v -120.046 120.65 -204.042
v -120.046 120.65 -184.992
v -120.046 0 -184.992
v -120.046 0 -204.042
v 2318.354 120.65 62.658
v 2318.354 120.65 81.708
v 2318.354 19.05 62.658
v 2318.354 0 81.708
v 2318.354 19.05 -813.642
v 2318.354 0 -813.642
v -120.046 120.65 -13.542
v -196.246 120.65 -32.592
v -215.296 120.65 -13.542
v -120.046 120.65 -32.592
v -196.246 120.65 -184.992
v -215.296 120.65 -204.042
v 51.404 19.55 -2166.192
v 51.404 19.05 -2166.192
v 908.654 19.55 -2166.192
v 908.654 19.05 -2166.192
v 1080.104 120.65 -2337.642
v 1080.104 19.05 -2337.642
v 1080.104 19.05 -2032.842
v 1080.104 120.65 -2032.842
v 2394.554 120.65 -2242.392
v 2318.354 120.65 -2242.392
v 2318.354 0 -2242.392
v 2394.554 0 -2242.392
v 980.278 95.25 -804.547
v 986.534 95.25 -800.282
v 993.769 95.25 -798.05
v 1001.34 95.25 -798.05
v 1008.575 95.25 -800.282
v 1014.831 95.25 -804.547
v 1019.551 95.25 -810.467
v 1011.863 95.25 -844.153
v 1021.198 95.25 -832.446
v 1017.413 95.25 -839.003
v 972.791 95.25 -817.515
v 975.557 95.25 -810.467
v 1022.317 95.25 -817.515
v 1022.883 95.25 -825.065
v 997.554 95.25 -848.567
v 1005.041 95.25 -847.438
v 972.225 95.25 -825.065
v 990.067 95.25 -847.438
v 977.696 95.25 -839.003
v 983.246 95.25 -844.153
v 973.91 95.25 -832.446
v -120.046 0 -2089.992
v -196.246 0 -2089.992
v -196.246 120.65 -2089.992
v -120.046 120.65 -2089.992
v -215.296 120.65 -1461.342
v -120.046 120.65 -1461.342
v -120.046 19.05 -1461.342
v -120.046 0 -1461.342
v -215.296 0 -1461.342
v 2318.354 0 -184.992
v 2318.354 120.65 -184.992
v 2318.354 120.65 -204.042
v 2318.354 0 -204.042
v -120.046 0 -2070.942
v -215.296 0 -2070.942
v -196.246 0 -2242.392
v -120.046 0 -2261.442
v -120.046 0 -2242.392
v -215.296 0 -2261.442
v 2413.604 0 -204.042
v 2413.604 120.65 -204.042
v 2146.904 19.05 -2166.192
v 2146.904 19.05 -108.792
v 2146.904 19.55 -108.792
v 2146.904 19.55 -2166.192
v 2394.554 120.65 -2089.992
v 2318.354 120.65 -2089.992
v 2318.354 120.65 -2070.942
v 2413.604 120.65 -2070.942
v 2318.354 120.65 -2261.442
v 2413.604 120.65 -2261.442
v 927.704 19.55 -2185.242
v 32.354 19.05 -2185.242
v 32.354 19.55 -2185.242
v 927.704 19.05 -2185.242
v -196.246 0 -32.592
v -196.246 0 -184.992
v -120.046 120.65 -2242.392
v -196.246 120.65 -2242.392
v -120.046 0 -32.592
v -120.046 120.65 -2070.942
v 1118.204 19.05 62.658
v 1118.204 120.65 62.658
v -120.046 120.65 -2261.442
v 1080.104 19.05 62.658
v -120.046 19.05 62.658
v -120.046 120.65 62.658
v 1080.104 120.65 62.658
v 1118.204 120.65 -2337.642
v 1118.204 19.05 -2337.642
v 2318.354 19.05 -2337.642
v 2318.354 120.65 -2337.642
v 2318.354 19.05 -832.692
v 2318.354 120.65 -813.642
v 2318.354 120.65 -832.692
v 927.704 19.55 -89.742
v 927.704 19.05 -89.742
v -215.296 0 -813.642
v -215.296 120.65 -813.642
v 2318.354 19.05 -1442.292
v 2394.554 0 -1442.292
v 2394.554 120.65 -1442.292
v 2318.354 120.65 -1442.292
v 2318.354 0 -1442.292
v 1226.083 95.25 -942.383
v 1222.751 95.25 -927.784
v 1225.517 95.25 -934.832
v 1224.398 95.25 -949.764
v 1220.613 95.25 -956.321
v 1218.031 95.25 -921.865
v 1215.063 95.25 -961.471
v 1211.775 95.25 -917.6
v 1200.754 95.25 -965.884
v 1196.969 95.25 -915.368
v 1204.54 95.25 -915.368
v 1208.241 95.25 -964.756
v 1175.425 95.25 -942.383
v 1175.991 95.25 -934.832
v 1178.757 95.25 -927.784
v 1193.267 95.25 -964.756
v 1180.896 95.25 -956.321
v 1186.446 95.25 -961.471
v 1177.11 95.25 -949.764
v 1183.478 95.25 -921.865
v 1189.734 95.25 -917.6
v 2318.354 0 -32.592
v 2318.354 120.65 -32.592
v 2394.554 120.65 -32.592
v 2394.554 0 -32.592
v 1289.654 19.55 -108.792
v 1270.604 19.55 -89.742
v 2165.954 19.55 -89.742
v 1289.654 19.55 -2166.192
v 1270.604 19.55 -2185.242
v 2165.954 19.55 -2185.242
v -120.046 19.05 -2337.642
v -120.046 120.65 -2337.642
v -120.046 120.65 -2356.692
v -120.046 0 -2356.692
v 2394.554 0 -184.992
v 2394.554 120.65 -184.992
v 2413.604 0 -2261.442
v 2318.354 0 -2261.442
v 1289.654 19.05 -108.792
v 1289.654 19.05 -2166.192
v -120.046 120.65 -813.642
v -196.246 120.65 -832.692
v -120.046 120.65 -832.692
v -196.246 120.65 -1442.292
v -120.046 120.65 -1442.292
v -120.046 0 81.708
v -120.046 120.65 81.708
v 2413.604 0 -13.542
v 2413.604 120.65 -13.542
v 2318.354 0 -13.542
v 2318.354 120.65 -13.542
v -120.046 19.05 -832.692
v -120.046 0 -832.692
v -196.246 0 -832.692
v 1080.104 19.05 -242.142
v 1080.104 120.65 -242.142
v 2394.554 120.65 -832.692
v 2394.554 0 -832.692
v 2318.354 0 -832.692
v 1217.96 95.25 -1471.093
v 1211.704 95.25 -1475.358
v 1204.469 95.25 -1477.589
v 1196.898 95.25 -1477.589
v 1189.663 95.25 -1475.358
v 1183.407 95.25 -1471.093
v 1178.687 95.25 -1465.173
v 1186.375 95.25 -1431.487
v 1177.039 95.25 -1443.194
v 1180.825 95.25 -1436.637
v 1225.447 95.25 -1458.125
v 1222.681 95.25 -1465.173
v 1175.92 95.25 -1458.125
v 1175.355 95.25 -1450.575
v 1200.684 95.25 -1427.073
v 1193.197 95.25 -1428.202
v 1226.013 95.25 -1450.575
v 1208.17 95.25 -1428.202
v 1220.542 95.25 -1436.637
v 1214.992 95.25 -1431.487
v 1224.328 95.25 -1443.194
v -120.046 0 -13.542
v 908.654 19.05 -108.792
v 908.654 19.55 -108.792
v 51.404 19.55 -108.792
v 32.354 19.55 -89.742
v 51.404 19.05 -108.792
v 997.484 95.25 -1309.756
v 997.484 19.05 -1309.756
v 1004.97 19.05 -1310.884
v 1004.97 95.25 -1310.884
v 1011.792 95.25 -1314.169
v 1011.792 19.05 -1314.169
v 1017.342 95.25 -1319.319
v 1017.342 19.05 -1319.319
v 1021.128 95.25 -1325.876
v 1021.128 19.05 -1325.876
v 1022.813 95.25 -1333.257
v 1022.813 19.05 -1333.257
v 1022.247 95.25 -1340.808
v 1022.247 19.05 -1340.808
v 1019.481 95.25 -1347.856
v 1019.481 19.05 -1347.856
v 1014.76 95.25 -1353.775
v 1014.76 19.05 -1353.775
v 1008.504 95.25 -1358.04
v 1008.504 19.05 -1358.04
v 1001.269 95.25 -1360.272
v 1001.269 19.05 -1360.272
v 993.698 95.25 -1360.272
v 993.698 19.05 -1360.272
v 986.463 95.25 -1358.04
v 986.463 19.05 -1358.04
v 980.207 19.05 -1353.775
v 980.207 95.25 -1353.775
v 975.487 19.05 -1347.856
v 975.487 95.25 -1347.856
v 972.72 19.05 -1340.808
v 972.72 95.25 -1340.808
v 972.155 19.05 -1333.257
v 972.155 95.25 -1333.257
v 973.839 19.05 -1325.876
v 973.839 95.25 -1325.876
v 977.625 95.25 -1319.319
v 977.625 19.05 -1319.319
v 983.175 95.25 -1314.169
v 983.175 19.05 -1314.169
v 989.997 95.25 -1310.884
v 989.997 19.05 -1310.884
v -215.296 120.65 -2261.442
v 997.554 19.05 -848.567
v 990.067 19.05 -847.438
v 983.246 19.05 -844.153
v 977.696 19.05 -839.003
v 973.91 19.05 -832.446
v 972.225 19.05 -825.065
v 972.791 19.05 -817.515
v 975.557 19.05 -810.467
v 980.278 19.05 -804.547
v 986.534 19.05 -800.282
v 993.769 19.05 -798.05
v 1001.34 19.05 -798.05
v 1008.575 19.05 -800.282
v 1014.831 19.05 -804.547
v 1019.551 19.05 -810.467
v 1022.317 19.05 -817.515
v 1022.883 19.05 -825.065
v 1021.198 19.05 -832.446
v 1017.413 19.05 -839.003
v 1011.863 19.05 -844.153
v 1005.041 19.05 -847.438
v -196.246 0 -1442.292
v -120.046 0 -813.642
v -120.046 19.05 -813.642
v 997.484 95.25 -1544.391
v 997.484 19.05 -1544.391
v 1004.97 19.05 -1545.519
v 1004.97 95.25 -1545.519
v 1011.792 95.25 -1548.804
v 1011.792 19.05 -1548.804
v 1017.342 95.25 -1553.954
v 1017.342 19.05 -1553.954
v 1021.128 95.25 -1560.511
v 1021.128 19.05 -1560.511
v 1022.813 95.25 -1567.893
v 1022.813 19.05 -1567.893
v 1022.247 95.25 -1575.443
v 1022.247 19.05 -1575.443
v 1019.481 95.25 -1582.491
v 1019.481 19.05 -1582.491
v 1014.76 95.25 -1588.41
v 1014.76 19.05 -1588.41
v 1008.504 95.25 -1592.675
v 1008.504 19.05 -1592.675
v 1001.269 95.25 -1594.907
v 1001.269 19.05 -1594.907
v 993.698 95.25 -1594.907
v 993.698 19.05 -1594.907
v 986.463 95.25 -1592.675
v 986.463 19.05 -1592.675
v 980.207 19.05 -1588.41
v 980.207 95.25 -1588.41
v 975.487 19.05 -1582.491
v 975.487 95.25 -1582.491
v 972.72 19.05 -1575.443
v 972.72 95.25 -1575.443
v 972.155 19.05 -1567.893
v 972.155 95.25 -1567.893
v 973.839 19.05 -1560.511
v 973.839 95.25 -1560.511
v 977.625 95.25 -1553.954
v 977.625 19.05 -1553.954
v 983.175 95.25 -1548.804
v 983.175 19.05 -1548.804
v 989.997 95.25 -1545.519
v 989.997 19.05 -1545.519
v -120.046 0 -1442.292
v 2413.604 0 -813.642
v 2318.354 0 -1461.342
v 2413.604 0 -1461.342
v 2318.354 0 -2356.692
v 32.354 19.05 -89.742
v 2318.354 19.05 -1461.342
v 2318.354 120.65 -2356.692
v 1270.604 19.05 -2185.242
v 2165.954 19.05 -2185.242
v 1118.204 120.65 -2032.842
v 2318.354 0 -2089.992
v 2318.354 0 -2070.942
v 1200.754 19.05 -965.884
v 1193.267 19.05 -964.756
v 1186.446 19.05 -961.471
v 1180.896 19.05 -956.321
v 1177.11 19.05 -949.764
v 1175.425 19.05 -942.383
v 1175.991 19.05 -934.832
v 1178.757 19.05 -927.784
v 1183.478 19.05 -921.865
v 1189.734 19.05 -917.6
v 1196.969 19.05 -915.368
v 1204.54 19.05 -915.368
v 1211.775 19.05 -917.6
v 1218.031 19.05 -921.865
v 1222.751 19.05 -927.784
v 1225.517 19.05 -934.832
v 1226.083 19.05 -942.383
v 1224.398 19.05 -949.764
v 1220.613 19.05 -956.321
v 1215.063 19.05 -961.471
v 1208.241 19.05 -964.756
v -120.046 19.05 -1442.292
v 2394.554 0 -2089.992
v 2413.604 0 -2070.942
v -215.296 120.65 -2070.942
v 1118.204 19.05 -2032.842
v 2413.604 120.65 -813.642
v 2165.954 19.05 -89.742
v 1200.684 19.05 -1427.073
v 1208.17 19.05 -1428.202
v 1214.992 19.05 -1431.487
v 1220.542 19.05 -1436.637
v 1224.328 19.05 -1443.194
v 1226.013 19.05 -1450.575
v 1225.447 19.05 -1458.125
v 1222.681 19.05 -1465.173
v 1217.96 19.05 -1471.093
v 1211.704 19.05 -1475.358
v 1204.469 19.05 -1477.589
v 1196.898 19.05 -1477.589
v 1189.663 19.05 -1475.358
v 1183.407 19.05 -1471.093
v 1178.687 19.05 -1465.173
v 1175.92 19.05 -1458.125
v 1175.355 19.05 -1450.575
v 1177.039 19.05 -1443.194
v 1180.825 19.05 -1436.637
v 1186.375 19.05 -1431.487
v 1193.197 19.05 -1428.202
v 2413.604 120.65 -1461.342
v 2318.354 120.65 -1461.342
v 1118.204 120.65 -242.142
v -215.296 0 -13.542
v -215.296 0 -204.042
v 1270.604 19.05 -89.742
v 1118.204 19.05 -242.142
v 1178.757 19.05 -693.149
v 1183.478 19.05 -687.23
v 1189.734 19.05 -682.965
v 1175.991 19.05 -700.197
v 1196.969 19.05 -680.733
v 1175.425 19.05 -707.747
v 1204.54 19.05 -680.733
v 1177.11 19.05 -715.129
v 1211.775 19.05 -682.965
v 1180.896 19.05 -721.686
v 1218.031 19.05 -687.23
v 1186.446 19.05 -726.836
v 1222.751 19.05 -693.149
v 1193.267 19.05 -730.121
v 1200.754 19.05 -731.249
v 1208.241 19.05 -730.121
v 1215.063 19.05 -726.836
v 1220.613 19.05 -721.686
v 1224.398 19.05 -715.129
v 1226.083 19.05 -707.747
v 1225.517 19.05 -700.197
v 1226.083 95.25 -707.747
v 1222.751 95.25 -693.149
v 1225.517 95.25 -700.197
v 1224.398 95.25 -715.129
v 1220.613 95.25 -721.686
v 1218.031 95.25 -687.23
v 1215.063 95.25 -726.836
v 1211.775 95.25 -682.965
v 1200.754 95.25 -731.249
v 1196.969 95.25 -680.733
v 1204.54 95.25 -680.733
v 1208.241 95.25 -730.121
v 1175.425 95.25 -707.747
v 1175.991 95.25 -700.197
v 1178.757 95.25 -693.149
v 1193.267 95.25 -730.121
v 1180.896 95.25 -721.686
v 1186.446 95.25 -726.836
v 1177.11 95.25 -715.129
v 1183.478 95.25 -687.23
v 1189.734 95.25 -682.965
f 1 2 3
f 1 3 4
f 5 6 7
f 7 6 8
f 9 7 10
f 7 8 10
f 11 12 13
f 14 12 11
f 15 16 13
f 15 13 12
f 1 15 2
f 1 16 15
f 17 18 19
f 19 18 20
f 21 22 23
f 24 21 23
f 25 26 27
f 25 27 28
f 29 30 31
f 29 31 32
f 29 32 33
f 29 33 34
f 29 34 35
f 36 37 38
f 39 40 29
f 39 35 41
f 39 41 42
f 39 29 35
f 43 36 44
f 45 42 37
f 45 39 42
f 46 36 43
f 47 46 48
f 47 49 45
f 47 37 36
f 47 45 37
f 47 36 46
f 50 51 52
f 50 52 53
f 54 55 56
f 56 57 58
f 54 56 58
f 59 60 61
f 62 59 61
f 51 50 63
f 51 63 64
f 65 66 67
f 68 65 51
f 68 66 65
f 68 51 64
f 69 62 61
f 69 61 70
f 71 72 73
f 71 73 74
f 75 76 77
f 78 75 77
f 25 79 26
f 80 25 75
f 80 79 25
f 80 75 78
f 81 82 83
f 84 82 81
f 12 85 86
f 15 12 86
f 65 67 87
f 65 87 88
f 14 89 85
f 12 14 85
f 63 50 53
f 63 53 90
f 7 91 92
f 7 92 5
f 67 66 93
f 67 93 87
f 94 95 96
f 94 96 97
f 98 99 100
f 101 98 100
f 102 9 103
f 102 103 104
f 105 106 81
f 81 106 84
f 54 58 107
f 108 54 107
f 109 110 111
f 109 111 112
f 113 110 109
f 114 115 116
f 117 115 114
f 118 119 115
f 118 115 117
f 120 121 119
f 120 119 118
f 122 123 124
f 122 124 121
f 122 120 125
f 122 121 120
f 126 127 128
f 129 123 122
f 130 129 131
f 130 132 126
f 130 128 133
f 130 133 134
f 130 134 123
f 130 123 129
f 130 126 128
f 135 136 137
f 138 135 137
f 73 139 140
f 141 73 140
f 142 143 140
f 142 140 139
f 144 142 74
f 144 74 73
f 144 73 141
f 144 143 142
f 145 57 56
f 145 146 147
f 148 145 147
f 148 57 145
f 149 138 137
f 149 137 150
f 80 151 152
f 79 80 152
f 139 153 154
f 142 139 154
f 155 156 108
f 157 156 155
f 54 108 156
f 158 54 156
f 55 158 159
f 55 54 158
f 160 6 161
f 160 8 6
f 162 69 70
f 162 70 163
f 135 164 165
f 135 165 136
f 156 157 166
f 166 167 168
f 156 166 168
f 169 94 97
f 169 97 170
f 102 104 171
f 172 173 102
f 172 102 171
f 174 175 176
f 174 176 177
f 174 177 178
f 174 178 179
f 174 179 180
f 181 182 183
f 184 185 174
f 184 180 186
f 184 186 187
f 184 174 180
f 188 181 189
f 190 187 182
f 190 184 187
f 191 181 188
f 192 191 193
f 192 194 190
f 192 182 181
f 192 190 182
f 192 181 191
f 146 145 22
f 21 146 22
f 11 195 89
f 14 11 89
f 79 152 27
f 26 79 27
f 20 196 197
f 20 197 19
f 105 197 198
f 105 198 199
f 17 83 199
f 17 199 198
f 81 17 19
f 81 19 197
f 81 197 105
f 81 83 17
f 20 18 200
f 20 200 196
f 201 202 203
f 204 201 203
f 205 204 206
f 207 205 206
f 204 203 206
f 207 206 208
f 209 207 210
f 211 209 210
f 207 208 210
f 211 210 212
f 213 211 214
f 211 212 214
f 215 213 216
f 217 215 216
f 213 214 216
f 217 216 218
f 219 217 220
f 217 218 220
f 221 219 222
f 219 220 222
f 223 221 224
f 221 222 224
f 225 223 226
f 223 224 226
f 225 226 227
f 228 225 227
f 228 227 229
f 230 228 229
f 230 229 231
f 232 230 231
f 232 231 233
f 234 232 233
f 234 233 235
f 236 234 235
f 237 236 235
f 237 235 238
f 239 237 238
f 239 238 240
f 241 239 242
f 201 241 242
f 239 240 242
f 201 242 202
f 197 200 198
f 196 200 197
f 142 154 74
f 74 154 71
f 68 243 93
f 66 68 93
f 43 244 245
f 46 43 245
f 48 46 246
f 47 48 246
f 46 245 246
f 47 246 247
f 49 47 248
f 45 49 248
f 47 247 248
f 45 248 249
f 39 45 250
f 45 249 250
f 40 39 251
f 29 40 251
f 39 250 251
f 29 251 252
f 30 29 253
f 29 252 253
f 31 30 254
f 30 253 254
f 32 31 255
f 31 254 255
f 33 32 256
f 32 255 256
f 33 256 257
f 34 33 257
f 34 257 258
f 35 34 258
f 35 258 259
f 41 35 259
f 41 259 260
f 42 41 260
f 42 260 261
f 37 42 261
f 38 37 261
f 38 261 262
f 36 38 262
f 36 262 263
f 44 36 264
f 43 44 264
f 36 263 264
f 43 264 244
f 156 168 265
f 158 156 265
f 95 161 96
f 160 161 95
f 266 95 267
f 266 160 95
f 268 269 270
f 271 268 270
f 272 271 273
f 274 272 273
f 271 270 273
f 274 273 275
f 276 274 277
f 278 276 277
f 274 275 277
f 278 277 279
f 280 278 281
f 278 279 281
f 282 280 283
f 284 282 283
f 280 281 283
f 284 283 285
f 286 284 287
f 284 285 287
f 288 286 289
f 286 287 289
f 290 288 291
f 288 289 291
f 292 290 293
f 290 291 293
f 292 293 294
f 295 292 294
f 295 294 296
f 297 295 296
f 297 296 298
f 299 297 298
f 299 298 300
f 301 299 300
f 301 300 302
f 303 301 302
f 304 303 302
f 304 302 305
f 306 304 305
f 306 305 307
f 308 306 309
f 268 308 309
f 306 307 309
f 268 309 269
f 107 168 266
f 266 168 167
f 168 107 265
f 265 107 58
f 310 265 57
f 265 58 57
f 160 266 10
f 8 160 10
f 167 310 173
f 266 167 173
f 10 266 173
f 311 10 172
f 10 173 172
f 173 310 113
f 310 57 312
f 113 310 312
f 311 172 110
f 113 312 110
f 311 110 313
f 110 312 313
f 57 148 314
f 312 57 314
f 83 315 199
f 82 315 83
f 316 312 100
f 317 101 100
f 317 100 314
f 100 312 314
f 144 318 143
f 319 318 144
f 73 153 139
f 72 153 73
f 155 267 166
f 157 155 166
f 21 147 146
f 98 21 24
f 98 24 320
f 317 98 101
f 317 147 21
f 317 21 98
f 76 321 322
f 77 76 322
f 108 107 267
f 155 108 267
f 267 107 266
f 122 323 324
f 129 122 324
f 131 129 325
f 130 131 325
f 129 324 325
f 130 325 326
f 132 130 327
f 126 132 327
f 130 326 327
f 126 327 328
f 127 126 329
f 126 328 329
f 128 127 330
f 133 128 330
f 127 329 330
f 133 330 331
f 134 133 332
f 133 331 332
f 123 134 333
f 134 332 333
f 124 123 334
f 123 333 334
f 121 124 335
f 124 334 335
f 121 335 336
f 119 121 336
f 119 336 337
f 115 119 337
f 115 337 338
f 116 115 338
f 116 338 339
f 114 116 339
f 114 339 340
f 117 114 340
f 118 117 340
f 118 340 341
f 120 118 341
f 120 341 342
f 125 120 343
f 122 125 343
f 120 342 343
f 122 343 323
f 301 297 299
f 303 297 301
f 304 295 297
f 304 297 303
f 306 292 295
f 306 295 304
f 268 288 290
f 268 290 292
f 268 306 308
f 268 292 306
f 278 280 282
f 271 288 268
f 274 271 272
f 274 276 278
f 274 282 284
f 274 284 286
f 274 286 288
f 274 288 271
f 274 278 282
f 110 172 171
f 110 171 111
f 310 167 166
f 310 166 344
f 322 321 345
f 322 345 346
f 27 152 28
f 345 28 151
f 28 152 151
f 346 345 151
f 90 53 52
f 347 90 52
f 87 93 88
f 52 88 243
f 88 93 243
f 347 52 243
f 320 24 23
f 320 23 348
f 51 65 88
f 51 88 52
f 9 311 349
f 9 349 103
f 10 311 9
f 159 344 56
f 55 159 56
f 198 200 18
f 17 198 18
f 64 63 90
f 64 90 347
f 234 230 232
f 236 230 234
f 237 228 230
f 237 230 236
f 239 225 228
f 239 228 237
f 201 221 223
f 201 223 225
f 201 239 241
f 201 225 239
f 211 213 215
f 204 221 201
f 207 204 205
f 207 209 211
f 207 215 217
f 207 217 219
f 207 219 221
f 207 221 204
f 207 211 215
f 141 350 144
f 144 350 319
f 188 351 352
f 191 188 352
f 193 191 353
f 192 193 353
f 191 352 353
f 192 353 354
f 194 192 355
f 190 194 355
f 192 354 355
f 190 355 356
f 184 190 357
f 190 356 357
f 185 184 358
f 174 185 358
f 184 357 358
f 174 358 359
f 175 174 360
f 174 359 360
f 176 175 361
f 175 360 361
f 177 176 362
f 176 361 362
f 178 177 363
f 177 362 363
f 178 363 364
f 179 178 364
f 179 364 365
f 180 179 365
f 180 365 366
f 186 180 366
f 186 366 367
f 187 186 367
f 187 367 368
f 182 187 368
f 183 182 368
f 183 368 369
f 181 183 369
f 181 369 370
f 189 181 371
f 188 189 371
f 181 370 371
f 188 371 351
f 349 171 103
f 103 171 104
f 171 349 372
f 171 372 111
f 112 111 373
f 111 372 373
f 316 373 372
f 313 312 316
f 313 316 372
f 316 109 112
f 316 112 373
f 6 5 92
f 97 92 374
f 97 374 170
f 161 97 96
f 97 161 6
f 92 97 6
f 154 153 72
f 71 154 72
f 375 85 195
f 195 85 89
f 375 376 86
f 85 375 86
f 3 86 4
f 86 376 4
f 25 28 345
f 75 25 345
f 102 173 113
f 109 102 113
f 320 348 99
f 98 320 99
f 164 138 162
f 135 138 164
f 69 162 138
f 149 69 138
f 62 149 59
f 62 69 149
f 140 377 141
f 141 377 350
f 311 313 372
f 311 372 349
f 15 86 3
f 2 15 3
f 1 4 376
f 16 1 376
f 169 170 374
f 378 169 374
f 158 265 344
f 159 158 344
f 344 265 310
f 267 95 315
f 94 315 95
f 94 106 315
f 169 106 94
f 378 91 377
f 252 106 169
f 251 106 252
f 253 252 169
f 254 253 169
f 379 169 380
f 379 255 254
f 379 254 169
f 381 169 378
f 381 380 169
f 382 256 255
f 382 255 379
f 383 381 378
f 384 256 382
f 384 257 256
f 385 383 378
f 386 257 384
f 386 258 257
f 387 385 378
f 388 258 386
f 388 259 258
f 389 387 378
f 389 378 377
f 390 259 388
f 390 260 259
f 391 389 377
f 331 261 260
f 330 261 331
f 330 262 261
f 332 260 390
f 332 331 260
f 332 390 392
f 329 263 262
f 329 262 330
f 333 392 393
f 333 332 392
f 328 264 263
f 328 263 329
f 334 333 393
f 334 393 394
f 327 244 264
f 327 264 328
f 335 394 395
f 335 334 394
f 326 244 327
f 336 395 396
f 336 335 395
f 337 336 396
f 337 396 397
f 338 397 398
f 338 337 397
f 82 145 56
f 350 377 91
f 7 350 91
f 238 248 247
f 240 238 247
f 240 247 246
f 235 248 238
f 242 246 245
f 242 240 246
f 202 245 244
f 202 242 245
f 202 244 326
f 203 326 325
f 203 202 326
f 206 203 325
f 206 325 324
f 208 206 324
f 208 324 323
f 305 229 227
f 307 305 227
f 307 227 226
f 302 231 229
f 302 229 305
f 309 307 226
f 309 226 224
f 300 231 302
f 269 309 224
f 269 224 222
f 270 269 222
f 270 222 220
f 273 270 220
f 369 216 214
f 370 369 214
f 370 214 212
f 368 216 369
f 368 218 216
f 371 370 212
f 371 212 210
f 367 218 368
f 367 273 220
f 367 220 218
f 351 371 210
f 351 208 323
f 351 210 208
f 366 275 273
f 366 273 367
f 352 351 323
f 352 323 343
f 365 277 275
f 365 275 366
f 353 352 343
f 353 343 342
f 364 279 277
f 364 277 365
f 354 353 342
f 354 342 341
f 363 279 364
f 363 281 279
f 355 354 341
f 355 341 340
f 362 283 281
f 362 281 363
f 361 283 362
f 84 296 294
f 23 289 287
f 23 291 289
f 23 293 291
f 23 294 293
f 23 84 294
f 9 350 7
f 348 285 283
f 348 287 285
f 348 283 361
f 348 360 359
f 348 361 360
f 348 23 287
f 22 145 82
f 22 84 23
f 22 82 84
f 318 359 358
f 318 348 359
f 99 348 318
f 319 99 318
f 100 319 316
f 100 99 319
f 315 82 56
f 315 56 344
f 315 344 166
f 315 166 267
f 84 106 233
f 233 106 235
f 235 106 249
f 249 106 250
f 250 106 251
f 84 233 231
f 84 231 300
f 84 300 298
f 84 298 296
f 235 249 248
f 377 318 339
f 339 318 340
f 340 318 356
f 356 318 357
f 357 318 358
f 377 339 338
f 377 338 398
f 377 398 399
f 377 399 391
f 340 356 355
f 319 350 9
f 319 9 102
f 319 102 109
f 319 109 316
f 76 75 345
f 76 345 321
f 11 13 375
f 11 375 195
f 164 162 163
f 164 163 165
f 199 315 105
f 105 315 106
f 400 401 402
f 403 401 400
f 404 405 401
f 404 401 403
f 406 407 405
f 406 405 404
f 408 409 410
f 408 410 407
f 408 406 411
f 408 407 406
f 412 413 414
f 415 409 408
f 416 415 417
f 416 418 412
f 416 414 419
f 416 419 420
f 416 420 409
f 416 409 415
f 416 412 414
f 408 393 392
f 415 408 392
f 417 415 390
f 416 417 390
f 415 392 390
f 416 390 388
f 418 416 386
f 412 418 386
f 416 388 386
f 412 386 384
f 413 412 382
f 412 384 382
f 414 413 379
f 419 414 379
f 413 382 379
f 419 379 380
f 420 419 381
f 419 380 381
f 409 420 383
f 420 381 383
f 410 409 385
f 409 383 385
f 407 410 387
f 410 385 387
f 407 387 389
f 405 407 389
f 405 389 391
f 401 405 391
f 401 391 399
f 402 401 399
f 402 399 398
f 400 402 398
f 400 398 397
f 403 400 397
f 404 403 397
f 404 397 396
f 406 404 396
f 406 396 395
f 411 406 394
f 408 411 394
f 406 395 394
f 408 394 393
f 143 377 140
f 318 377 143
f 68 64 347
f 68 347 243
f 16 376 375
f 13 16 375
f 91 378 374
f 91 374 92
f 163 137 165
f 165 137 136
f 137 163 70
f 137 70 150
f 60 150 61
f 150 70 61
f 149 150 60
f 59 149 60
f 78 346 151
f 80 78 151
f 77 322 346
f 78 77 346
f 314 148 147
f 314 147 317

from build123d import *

# Parameters (mm, degrees)
SKETCH1_W                  = 2438.4
SKETCH1_H                  = 2438.4
BOSS_EXTRUDE1_DEPTH        = 19.05
BOSS_EXTRUDE2_DEPTH        = 101.6
BOSS_EXTRUDE3_DEPTH        = 101.6
BOSS_EXTRUDE3_DEPTH_BACK   = 19.05
BOSS_EXTRUDE3_2_DEPTH      = 101.6
BOSS_EXTRUDE3_2_DEPTH_BACK = 19.05
BOSS_EXTRUDE3_3_DEPTH      = 101.6
BOSS_EXTRUDE3_3_DEPTH_BACK = 19.05
BOSS_EXTRUDE3_4_DEPTH      = 101.6
BOSS_EXTRUDE3_4_DEPTH_BACK = 19.05
BOSS_EXTRUDE4_DEPTH        = 101.6
BOSS_EXTRUDE4_DEPTH_BACK   = 19.05
SKETCH6_R                  = 25.4
BOSS_EXTRUDE5_DEPTH        = 76.2
CIRPATTERN1_COUNT          = 2
SKETCH7_W                  = 895.35
SKETCH7_H                  = 2095.5
SKETCH7_W_2                = 857.25
SKETCH7_H_2                = 2057.4
BOSS_EXTRUDE6_DEPTH        = 0.5


with BuildPart() as part:
    # Sketch1 → Boss-Extrude1 (new body)
    with BuildSketch(Plane(origin=(0, 0, 0), x_dir=(1, 0, 0), z_dir=(0, 1, 0))):
        with Locations((1099.154268687, 1137.491799293)):
            Rectangle(SKETCH1_W, SKETCH1_H)
    extrude(amount=BOSS_EXTRUDE1_DEPTH)

    # Sketch2 → Boss-Extrude2 (add)
    with BuildSketch(Plane(origin=(0, 19.05, 0), x_dir=(1, 0, 0), z_dir=(0, 1, 0))):
        Polygon((-120.045731313, -62.658200707), (1080.104268687, -62.658200707), (1080.104268687, 242.141799293), (1118.204268687, 242.141799293), (1118.204268687, -62.658200707), (2318.354268687, -62.658200707), (2318.354268687, -81.708200707), (-120.045731313, -81.708200707), align=None)
        Polygon((-120.045731313, 2356.691799293), (-120.045731313, 2337.641799293), (1080.104268687, 2337.641799293), (1080.104268687, 2032.841799293), (1118.204268687, 2032.841799293), (1118.204268687, 2337.641799293), (2318.354268687, 2337.641799293), (2318.354268687, 2356.691799293), align=None)
    extrude(amount=BOSS_EXTRUDE2_DEPTH)

    # Sketch5 → Boss-Extrude4 (add, two sides: drawn at the far end of the back side and taken through both)
    with BuildSketch(Plane(origin=(0, 19.05, 0), x_dir=(1, 0, 0), z_dir=(0, 1, 0)).offset(-BOSS_EXTRUDE4_DEPTH_BACK)):
        Polygon((-120.045731313, 1461.341799293), (-215.295731313, 1461.341799293), (-215.295731313, 813.641799293), (-120.045731313, 813.641799293), (-120.045731313, 832.691799293), (-196.245731313, 832.691799293), (-196.245731313, 1442.291799293), (-120.045731313, 1442.291799293), align=None)
        Polygon((2318.354268687, 1442.291799293), (2318.354268687, 1461.341799293), (2413.604268687, 1461.341799293), (2413.604268687, 813.641799293), (2318.354268687, 813.641799293), (2318.354268687, 832.691799293), (2394.554268687, 832.691799293), (2394.554268687, 1442.291799293), align=None)
    extrude(amount=BOSS_EXTRUDE4_DEPTH + BOSS_EXTRUDE4_DEPTH_BACK)

    # Sketch6 → Boss-Extrude5 (add)
    with BuildSketch(Plane(origin=(0, 19.05, 0), x_dir=(1, 0, 0), z_dir=(0, 1, 0))):
        with Locations((997.554268687, 823.166799293)):
            Circle(SKETCH6_R)
        with Locations((1200.754268687, 940.484373993)):
            Circle(SKETCH6_R)
        with Locations((1200.754268687, 705.849224594)):
            Circle(SKETCH6_R)
    boss_extrude5 = extrude(amount=BOSS_EXTRUDE5_DEPTH)

    # CirPattern1: Boss-Extrude5 ×2 about axis
    cirpattern1_axis = Axis((1099.118908009, 19.05, -1137.81999058), (0, 1, 0))
    for i in range(1, CIRPATTERN1_COUNT):
        add(boss_extrude5.rotate(cirpattern1_axis, i * 360 / CIRPATTERN1_COUNT))

    # Sketch7 → Boss-Extrude6 (add)
    # profile 1 of 2: a face of its own
    with BuildSketch(Plane(origin=(0, 19.05, 0), x_dir=(1, 0, 0), z_dir=(0, 1, 0))):
        with Locations((480.029268687, 1137.491799293)):
            Rectangle(SKETCH7_W, SKETCH7_H)
        with Locations((480.029268687, 1137.491799293)):
            Rectangle(SKETCH7_W_2, SKETCH7_H_2, mode=Mode.SUBTRACT)
    # profile 2 of 2: a face of its own
    with BuildSketch(Plane(origin=(0, 19.05, 0), x_dir=(1, 0, 0), z_dir=(0, 1, 0))):
        with Locations((1718.279268687, 1137.491799293)):
            Rectangle(SKETCH7_W, SKETCH7_H)
        with Locations((1718.279268687, 1137.491799293)):
            Rectangle(SKETCH7_W_2, SKETCH7_H_2, mode=Mode.SUBTRACT)
    extrude(amount=BOSS_EXTRUDE6_DEPTH)


with BuildPart() as body_2:
    # Sketch3 → Boss-Extrude3 (new, two sides: drawn at the far end of the back side and taken through both)
    with BuildSketch(Plane(origin=(0, 19.05, 0), x_dir=(1, 0, 0), z_dir=(0, 1, 0)).offset(-BOSS_EXTRUDE3_DEPTH_BACK)):
        Polygon((-120.045731313, 32.591799293), (-196.245731313, 32.591799293), (-196.245731313, 184.991799293), (-120.045731313, 184.991799293), (-120.045731313, 204.041799293), (-215.295731313, 204.041799293), (-215.295731313, 13.541799293), (-120.045731313, 13.541799293), align=None)
    extrude(amount=BOSS_EXTRUDE3_DEPTH + BOSS_EXTRUDE3_DEPTH_BACK)


with BuildPart() as body_3:
    # Sketch3 → Boss-Extrude3 2 (new, two sides: drawn at the far end of the back side and taken through both)
    with BuildSketch(Plane(origin=(0, 19.05, 0), x_dir=(1, 0, 0), z_dir=(0, 1, 0)).offset(-BOSS_EXTRUDE3_2_DEPTH_BACK)):
        Polygon((-120.045731313, 2261.441799293), (-120.045731313, 2242.391799293), (-196.245731313, 2242.391799293), (-196.245731313, 2089.991799293), (-120.045731313, 2089.991799293), (-120.045731313, 2070.941799293), (-215.295731313, 2070.941799293), (-215.295731313, 2261.441799293), align=None)
    extrude(amount=BOSS_EXTRUDE3_2_DEPTH + BOSS_EXTRUDE3_2_DEPTH_BACK)


with BuildPart() as body_4:
    # Sketch3 → Boss-Extrude3 3 (new, two sides: drawn at the far end of the back side and taken through both)
    with BuildSketch(Plane(origin=(0, 19.05, 0), x_dir=(1, 0, 0), z_dir=(0, 1, 0)).offset(-BOSS_EXTRUDE3_3_DEPTH_BACK)):
        Polygon((2318.354268687, 2242.391799293), (2394.554268687, 2242.391799293), (2394.554268687, 2089.991799293), (2318.354268687, 2089.991799293), (2318.354268687, 2070.941799293), (2413.604268687, 2070.941799293), (2413.604268687, 2261.441799293), (2318.354268687, 2261.441799293), align=None)
    extrude(amount=BOSS_EXTRUDE3_3_DEPTH + BOSS_EXTRUDE3_3_DEPTH_BACK)


with BuildPart() as body_5:
    # Sketch3 → Boss-Extrude3 4 (new, two sides: drawn at the far end of the back side and taken through both)
    with BuildSketch(Plane(origin=(0, 19.05, 0), x_dir=(1, 0, 0), z_dir=(0, 1, 0)).offset(-BOSS_EXTRUDE3_4_DEPTH_BACK)):
        Polygon((2318.354268687, 13.541799293), (2318.354268687, 32.591799293), (2394.554268687, 32.591799293), (2394.554268687, 184.991799293), (2318.354268687, 184.991799293), (2318.354268687, 204.041799293), (2413.604268687, 204.041799293), (2413.604268687, 13.541799293), align=None)
    extrude(amount=BOSS_EXTRUDE3_4_DEPTH + BOSS_EXTRUDE3_4_DEPTH_BACK)


solid = Compound([part.part, body_2.part, body_3.part, body_4.part, body_5.part])
